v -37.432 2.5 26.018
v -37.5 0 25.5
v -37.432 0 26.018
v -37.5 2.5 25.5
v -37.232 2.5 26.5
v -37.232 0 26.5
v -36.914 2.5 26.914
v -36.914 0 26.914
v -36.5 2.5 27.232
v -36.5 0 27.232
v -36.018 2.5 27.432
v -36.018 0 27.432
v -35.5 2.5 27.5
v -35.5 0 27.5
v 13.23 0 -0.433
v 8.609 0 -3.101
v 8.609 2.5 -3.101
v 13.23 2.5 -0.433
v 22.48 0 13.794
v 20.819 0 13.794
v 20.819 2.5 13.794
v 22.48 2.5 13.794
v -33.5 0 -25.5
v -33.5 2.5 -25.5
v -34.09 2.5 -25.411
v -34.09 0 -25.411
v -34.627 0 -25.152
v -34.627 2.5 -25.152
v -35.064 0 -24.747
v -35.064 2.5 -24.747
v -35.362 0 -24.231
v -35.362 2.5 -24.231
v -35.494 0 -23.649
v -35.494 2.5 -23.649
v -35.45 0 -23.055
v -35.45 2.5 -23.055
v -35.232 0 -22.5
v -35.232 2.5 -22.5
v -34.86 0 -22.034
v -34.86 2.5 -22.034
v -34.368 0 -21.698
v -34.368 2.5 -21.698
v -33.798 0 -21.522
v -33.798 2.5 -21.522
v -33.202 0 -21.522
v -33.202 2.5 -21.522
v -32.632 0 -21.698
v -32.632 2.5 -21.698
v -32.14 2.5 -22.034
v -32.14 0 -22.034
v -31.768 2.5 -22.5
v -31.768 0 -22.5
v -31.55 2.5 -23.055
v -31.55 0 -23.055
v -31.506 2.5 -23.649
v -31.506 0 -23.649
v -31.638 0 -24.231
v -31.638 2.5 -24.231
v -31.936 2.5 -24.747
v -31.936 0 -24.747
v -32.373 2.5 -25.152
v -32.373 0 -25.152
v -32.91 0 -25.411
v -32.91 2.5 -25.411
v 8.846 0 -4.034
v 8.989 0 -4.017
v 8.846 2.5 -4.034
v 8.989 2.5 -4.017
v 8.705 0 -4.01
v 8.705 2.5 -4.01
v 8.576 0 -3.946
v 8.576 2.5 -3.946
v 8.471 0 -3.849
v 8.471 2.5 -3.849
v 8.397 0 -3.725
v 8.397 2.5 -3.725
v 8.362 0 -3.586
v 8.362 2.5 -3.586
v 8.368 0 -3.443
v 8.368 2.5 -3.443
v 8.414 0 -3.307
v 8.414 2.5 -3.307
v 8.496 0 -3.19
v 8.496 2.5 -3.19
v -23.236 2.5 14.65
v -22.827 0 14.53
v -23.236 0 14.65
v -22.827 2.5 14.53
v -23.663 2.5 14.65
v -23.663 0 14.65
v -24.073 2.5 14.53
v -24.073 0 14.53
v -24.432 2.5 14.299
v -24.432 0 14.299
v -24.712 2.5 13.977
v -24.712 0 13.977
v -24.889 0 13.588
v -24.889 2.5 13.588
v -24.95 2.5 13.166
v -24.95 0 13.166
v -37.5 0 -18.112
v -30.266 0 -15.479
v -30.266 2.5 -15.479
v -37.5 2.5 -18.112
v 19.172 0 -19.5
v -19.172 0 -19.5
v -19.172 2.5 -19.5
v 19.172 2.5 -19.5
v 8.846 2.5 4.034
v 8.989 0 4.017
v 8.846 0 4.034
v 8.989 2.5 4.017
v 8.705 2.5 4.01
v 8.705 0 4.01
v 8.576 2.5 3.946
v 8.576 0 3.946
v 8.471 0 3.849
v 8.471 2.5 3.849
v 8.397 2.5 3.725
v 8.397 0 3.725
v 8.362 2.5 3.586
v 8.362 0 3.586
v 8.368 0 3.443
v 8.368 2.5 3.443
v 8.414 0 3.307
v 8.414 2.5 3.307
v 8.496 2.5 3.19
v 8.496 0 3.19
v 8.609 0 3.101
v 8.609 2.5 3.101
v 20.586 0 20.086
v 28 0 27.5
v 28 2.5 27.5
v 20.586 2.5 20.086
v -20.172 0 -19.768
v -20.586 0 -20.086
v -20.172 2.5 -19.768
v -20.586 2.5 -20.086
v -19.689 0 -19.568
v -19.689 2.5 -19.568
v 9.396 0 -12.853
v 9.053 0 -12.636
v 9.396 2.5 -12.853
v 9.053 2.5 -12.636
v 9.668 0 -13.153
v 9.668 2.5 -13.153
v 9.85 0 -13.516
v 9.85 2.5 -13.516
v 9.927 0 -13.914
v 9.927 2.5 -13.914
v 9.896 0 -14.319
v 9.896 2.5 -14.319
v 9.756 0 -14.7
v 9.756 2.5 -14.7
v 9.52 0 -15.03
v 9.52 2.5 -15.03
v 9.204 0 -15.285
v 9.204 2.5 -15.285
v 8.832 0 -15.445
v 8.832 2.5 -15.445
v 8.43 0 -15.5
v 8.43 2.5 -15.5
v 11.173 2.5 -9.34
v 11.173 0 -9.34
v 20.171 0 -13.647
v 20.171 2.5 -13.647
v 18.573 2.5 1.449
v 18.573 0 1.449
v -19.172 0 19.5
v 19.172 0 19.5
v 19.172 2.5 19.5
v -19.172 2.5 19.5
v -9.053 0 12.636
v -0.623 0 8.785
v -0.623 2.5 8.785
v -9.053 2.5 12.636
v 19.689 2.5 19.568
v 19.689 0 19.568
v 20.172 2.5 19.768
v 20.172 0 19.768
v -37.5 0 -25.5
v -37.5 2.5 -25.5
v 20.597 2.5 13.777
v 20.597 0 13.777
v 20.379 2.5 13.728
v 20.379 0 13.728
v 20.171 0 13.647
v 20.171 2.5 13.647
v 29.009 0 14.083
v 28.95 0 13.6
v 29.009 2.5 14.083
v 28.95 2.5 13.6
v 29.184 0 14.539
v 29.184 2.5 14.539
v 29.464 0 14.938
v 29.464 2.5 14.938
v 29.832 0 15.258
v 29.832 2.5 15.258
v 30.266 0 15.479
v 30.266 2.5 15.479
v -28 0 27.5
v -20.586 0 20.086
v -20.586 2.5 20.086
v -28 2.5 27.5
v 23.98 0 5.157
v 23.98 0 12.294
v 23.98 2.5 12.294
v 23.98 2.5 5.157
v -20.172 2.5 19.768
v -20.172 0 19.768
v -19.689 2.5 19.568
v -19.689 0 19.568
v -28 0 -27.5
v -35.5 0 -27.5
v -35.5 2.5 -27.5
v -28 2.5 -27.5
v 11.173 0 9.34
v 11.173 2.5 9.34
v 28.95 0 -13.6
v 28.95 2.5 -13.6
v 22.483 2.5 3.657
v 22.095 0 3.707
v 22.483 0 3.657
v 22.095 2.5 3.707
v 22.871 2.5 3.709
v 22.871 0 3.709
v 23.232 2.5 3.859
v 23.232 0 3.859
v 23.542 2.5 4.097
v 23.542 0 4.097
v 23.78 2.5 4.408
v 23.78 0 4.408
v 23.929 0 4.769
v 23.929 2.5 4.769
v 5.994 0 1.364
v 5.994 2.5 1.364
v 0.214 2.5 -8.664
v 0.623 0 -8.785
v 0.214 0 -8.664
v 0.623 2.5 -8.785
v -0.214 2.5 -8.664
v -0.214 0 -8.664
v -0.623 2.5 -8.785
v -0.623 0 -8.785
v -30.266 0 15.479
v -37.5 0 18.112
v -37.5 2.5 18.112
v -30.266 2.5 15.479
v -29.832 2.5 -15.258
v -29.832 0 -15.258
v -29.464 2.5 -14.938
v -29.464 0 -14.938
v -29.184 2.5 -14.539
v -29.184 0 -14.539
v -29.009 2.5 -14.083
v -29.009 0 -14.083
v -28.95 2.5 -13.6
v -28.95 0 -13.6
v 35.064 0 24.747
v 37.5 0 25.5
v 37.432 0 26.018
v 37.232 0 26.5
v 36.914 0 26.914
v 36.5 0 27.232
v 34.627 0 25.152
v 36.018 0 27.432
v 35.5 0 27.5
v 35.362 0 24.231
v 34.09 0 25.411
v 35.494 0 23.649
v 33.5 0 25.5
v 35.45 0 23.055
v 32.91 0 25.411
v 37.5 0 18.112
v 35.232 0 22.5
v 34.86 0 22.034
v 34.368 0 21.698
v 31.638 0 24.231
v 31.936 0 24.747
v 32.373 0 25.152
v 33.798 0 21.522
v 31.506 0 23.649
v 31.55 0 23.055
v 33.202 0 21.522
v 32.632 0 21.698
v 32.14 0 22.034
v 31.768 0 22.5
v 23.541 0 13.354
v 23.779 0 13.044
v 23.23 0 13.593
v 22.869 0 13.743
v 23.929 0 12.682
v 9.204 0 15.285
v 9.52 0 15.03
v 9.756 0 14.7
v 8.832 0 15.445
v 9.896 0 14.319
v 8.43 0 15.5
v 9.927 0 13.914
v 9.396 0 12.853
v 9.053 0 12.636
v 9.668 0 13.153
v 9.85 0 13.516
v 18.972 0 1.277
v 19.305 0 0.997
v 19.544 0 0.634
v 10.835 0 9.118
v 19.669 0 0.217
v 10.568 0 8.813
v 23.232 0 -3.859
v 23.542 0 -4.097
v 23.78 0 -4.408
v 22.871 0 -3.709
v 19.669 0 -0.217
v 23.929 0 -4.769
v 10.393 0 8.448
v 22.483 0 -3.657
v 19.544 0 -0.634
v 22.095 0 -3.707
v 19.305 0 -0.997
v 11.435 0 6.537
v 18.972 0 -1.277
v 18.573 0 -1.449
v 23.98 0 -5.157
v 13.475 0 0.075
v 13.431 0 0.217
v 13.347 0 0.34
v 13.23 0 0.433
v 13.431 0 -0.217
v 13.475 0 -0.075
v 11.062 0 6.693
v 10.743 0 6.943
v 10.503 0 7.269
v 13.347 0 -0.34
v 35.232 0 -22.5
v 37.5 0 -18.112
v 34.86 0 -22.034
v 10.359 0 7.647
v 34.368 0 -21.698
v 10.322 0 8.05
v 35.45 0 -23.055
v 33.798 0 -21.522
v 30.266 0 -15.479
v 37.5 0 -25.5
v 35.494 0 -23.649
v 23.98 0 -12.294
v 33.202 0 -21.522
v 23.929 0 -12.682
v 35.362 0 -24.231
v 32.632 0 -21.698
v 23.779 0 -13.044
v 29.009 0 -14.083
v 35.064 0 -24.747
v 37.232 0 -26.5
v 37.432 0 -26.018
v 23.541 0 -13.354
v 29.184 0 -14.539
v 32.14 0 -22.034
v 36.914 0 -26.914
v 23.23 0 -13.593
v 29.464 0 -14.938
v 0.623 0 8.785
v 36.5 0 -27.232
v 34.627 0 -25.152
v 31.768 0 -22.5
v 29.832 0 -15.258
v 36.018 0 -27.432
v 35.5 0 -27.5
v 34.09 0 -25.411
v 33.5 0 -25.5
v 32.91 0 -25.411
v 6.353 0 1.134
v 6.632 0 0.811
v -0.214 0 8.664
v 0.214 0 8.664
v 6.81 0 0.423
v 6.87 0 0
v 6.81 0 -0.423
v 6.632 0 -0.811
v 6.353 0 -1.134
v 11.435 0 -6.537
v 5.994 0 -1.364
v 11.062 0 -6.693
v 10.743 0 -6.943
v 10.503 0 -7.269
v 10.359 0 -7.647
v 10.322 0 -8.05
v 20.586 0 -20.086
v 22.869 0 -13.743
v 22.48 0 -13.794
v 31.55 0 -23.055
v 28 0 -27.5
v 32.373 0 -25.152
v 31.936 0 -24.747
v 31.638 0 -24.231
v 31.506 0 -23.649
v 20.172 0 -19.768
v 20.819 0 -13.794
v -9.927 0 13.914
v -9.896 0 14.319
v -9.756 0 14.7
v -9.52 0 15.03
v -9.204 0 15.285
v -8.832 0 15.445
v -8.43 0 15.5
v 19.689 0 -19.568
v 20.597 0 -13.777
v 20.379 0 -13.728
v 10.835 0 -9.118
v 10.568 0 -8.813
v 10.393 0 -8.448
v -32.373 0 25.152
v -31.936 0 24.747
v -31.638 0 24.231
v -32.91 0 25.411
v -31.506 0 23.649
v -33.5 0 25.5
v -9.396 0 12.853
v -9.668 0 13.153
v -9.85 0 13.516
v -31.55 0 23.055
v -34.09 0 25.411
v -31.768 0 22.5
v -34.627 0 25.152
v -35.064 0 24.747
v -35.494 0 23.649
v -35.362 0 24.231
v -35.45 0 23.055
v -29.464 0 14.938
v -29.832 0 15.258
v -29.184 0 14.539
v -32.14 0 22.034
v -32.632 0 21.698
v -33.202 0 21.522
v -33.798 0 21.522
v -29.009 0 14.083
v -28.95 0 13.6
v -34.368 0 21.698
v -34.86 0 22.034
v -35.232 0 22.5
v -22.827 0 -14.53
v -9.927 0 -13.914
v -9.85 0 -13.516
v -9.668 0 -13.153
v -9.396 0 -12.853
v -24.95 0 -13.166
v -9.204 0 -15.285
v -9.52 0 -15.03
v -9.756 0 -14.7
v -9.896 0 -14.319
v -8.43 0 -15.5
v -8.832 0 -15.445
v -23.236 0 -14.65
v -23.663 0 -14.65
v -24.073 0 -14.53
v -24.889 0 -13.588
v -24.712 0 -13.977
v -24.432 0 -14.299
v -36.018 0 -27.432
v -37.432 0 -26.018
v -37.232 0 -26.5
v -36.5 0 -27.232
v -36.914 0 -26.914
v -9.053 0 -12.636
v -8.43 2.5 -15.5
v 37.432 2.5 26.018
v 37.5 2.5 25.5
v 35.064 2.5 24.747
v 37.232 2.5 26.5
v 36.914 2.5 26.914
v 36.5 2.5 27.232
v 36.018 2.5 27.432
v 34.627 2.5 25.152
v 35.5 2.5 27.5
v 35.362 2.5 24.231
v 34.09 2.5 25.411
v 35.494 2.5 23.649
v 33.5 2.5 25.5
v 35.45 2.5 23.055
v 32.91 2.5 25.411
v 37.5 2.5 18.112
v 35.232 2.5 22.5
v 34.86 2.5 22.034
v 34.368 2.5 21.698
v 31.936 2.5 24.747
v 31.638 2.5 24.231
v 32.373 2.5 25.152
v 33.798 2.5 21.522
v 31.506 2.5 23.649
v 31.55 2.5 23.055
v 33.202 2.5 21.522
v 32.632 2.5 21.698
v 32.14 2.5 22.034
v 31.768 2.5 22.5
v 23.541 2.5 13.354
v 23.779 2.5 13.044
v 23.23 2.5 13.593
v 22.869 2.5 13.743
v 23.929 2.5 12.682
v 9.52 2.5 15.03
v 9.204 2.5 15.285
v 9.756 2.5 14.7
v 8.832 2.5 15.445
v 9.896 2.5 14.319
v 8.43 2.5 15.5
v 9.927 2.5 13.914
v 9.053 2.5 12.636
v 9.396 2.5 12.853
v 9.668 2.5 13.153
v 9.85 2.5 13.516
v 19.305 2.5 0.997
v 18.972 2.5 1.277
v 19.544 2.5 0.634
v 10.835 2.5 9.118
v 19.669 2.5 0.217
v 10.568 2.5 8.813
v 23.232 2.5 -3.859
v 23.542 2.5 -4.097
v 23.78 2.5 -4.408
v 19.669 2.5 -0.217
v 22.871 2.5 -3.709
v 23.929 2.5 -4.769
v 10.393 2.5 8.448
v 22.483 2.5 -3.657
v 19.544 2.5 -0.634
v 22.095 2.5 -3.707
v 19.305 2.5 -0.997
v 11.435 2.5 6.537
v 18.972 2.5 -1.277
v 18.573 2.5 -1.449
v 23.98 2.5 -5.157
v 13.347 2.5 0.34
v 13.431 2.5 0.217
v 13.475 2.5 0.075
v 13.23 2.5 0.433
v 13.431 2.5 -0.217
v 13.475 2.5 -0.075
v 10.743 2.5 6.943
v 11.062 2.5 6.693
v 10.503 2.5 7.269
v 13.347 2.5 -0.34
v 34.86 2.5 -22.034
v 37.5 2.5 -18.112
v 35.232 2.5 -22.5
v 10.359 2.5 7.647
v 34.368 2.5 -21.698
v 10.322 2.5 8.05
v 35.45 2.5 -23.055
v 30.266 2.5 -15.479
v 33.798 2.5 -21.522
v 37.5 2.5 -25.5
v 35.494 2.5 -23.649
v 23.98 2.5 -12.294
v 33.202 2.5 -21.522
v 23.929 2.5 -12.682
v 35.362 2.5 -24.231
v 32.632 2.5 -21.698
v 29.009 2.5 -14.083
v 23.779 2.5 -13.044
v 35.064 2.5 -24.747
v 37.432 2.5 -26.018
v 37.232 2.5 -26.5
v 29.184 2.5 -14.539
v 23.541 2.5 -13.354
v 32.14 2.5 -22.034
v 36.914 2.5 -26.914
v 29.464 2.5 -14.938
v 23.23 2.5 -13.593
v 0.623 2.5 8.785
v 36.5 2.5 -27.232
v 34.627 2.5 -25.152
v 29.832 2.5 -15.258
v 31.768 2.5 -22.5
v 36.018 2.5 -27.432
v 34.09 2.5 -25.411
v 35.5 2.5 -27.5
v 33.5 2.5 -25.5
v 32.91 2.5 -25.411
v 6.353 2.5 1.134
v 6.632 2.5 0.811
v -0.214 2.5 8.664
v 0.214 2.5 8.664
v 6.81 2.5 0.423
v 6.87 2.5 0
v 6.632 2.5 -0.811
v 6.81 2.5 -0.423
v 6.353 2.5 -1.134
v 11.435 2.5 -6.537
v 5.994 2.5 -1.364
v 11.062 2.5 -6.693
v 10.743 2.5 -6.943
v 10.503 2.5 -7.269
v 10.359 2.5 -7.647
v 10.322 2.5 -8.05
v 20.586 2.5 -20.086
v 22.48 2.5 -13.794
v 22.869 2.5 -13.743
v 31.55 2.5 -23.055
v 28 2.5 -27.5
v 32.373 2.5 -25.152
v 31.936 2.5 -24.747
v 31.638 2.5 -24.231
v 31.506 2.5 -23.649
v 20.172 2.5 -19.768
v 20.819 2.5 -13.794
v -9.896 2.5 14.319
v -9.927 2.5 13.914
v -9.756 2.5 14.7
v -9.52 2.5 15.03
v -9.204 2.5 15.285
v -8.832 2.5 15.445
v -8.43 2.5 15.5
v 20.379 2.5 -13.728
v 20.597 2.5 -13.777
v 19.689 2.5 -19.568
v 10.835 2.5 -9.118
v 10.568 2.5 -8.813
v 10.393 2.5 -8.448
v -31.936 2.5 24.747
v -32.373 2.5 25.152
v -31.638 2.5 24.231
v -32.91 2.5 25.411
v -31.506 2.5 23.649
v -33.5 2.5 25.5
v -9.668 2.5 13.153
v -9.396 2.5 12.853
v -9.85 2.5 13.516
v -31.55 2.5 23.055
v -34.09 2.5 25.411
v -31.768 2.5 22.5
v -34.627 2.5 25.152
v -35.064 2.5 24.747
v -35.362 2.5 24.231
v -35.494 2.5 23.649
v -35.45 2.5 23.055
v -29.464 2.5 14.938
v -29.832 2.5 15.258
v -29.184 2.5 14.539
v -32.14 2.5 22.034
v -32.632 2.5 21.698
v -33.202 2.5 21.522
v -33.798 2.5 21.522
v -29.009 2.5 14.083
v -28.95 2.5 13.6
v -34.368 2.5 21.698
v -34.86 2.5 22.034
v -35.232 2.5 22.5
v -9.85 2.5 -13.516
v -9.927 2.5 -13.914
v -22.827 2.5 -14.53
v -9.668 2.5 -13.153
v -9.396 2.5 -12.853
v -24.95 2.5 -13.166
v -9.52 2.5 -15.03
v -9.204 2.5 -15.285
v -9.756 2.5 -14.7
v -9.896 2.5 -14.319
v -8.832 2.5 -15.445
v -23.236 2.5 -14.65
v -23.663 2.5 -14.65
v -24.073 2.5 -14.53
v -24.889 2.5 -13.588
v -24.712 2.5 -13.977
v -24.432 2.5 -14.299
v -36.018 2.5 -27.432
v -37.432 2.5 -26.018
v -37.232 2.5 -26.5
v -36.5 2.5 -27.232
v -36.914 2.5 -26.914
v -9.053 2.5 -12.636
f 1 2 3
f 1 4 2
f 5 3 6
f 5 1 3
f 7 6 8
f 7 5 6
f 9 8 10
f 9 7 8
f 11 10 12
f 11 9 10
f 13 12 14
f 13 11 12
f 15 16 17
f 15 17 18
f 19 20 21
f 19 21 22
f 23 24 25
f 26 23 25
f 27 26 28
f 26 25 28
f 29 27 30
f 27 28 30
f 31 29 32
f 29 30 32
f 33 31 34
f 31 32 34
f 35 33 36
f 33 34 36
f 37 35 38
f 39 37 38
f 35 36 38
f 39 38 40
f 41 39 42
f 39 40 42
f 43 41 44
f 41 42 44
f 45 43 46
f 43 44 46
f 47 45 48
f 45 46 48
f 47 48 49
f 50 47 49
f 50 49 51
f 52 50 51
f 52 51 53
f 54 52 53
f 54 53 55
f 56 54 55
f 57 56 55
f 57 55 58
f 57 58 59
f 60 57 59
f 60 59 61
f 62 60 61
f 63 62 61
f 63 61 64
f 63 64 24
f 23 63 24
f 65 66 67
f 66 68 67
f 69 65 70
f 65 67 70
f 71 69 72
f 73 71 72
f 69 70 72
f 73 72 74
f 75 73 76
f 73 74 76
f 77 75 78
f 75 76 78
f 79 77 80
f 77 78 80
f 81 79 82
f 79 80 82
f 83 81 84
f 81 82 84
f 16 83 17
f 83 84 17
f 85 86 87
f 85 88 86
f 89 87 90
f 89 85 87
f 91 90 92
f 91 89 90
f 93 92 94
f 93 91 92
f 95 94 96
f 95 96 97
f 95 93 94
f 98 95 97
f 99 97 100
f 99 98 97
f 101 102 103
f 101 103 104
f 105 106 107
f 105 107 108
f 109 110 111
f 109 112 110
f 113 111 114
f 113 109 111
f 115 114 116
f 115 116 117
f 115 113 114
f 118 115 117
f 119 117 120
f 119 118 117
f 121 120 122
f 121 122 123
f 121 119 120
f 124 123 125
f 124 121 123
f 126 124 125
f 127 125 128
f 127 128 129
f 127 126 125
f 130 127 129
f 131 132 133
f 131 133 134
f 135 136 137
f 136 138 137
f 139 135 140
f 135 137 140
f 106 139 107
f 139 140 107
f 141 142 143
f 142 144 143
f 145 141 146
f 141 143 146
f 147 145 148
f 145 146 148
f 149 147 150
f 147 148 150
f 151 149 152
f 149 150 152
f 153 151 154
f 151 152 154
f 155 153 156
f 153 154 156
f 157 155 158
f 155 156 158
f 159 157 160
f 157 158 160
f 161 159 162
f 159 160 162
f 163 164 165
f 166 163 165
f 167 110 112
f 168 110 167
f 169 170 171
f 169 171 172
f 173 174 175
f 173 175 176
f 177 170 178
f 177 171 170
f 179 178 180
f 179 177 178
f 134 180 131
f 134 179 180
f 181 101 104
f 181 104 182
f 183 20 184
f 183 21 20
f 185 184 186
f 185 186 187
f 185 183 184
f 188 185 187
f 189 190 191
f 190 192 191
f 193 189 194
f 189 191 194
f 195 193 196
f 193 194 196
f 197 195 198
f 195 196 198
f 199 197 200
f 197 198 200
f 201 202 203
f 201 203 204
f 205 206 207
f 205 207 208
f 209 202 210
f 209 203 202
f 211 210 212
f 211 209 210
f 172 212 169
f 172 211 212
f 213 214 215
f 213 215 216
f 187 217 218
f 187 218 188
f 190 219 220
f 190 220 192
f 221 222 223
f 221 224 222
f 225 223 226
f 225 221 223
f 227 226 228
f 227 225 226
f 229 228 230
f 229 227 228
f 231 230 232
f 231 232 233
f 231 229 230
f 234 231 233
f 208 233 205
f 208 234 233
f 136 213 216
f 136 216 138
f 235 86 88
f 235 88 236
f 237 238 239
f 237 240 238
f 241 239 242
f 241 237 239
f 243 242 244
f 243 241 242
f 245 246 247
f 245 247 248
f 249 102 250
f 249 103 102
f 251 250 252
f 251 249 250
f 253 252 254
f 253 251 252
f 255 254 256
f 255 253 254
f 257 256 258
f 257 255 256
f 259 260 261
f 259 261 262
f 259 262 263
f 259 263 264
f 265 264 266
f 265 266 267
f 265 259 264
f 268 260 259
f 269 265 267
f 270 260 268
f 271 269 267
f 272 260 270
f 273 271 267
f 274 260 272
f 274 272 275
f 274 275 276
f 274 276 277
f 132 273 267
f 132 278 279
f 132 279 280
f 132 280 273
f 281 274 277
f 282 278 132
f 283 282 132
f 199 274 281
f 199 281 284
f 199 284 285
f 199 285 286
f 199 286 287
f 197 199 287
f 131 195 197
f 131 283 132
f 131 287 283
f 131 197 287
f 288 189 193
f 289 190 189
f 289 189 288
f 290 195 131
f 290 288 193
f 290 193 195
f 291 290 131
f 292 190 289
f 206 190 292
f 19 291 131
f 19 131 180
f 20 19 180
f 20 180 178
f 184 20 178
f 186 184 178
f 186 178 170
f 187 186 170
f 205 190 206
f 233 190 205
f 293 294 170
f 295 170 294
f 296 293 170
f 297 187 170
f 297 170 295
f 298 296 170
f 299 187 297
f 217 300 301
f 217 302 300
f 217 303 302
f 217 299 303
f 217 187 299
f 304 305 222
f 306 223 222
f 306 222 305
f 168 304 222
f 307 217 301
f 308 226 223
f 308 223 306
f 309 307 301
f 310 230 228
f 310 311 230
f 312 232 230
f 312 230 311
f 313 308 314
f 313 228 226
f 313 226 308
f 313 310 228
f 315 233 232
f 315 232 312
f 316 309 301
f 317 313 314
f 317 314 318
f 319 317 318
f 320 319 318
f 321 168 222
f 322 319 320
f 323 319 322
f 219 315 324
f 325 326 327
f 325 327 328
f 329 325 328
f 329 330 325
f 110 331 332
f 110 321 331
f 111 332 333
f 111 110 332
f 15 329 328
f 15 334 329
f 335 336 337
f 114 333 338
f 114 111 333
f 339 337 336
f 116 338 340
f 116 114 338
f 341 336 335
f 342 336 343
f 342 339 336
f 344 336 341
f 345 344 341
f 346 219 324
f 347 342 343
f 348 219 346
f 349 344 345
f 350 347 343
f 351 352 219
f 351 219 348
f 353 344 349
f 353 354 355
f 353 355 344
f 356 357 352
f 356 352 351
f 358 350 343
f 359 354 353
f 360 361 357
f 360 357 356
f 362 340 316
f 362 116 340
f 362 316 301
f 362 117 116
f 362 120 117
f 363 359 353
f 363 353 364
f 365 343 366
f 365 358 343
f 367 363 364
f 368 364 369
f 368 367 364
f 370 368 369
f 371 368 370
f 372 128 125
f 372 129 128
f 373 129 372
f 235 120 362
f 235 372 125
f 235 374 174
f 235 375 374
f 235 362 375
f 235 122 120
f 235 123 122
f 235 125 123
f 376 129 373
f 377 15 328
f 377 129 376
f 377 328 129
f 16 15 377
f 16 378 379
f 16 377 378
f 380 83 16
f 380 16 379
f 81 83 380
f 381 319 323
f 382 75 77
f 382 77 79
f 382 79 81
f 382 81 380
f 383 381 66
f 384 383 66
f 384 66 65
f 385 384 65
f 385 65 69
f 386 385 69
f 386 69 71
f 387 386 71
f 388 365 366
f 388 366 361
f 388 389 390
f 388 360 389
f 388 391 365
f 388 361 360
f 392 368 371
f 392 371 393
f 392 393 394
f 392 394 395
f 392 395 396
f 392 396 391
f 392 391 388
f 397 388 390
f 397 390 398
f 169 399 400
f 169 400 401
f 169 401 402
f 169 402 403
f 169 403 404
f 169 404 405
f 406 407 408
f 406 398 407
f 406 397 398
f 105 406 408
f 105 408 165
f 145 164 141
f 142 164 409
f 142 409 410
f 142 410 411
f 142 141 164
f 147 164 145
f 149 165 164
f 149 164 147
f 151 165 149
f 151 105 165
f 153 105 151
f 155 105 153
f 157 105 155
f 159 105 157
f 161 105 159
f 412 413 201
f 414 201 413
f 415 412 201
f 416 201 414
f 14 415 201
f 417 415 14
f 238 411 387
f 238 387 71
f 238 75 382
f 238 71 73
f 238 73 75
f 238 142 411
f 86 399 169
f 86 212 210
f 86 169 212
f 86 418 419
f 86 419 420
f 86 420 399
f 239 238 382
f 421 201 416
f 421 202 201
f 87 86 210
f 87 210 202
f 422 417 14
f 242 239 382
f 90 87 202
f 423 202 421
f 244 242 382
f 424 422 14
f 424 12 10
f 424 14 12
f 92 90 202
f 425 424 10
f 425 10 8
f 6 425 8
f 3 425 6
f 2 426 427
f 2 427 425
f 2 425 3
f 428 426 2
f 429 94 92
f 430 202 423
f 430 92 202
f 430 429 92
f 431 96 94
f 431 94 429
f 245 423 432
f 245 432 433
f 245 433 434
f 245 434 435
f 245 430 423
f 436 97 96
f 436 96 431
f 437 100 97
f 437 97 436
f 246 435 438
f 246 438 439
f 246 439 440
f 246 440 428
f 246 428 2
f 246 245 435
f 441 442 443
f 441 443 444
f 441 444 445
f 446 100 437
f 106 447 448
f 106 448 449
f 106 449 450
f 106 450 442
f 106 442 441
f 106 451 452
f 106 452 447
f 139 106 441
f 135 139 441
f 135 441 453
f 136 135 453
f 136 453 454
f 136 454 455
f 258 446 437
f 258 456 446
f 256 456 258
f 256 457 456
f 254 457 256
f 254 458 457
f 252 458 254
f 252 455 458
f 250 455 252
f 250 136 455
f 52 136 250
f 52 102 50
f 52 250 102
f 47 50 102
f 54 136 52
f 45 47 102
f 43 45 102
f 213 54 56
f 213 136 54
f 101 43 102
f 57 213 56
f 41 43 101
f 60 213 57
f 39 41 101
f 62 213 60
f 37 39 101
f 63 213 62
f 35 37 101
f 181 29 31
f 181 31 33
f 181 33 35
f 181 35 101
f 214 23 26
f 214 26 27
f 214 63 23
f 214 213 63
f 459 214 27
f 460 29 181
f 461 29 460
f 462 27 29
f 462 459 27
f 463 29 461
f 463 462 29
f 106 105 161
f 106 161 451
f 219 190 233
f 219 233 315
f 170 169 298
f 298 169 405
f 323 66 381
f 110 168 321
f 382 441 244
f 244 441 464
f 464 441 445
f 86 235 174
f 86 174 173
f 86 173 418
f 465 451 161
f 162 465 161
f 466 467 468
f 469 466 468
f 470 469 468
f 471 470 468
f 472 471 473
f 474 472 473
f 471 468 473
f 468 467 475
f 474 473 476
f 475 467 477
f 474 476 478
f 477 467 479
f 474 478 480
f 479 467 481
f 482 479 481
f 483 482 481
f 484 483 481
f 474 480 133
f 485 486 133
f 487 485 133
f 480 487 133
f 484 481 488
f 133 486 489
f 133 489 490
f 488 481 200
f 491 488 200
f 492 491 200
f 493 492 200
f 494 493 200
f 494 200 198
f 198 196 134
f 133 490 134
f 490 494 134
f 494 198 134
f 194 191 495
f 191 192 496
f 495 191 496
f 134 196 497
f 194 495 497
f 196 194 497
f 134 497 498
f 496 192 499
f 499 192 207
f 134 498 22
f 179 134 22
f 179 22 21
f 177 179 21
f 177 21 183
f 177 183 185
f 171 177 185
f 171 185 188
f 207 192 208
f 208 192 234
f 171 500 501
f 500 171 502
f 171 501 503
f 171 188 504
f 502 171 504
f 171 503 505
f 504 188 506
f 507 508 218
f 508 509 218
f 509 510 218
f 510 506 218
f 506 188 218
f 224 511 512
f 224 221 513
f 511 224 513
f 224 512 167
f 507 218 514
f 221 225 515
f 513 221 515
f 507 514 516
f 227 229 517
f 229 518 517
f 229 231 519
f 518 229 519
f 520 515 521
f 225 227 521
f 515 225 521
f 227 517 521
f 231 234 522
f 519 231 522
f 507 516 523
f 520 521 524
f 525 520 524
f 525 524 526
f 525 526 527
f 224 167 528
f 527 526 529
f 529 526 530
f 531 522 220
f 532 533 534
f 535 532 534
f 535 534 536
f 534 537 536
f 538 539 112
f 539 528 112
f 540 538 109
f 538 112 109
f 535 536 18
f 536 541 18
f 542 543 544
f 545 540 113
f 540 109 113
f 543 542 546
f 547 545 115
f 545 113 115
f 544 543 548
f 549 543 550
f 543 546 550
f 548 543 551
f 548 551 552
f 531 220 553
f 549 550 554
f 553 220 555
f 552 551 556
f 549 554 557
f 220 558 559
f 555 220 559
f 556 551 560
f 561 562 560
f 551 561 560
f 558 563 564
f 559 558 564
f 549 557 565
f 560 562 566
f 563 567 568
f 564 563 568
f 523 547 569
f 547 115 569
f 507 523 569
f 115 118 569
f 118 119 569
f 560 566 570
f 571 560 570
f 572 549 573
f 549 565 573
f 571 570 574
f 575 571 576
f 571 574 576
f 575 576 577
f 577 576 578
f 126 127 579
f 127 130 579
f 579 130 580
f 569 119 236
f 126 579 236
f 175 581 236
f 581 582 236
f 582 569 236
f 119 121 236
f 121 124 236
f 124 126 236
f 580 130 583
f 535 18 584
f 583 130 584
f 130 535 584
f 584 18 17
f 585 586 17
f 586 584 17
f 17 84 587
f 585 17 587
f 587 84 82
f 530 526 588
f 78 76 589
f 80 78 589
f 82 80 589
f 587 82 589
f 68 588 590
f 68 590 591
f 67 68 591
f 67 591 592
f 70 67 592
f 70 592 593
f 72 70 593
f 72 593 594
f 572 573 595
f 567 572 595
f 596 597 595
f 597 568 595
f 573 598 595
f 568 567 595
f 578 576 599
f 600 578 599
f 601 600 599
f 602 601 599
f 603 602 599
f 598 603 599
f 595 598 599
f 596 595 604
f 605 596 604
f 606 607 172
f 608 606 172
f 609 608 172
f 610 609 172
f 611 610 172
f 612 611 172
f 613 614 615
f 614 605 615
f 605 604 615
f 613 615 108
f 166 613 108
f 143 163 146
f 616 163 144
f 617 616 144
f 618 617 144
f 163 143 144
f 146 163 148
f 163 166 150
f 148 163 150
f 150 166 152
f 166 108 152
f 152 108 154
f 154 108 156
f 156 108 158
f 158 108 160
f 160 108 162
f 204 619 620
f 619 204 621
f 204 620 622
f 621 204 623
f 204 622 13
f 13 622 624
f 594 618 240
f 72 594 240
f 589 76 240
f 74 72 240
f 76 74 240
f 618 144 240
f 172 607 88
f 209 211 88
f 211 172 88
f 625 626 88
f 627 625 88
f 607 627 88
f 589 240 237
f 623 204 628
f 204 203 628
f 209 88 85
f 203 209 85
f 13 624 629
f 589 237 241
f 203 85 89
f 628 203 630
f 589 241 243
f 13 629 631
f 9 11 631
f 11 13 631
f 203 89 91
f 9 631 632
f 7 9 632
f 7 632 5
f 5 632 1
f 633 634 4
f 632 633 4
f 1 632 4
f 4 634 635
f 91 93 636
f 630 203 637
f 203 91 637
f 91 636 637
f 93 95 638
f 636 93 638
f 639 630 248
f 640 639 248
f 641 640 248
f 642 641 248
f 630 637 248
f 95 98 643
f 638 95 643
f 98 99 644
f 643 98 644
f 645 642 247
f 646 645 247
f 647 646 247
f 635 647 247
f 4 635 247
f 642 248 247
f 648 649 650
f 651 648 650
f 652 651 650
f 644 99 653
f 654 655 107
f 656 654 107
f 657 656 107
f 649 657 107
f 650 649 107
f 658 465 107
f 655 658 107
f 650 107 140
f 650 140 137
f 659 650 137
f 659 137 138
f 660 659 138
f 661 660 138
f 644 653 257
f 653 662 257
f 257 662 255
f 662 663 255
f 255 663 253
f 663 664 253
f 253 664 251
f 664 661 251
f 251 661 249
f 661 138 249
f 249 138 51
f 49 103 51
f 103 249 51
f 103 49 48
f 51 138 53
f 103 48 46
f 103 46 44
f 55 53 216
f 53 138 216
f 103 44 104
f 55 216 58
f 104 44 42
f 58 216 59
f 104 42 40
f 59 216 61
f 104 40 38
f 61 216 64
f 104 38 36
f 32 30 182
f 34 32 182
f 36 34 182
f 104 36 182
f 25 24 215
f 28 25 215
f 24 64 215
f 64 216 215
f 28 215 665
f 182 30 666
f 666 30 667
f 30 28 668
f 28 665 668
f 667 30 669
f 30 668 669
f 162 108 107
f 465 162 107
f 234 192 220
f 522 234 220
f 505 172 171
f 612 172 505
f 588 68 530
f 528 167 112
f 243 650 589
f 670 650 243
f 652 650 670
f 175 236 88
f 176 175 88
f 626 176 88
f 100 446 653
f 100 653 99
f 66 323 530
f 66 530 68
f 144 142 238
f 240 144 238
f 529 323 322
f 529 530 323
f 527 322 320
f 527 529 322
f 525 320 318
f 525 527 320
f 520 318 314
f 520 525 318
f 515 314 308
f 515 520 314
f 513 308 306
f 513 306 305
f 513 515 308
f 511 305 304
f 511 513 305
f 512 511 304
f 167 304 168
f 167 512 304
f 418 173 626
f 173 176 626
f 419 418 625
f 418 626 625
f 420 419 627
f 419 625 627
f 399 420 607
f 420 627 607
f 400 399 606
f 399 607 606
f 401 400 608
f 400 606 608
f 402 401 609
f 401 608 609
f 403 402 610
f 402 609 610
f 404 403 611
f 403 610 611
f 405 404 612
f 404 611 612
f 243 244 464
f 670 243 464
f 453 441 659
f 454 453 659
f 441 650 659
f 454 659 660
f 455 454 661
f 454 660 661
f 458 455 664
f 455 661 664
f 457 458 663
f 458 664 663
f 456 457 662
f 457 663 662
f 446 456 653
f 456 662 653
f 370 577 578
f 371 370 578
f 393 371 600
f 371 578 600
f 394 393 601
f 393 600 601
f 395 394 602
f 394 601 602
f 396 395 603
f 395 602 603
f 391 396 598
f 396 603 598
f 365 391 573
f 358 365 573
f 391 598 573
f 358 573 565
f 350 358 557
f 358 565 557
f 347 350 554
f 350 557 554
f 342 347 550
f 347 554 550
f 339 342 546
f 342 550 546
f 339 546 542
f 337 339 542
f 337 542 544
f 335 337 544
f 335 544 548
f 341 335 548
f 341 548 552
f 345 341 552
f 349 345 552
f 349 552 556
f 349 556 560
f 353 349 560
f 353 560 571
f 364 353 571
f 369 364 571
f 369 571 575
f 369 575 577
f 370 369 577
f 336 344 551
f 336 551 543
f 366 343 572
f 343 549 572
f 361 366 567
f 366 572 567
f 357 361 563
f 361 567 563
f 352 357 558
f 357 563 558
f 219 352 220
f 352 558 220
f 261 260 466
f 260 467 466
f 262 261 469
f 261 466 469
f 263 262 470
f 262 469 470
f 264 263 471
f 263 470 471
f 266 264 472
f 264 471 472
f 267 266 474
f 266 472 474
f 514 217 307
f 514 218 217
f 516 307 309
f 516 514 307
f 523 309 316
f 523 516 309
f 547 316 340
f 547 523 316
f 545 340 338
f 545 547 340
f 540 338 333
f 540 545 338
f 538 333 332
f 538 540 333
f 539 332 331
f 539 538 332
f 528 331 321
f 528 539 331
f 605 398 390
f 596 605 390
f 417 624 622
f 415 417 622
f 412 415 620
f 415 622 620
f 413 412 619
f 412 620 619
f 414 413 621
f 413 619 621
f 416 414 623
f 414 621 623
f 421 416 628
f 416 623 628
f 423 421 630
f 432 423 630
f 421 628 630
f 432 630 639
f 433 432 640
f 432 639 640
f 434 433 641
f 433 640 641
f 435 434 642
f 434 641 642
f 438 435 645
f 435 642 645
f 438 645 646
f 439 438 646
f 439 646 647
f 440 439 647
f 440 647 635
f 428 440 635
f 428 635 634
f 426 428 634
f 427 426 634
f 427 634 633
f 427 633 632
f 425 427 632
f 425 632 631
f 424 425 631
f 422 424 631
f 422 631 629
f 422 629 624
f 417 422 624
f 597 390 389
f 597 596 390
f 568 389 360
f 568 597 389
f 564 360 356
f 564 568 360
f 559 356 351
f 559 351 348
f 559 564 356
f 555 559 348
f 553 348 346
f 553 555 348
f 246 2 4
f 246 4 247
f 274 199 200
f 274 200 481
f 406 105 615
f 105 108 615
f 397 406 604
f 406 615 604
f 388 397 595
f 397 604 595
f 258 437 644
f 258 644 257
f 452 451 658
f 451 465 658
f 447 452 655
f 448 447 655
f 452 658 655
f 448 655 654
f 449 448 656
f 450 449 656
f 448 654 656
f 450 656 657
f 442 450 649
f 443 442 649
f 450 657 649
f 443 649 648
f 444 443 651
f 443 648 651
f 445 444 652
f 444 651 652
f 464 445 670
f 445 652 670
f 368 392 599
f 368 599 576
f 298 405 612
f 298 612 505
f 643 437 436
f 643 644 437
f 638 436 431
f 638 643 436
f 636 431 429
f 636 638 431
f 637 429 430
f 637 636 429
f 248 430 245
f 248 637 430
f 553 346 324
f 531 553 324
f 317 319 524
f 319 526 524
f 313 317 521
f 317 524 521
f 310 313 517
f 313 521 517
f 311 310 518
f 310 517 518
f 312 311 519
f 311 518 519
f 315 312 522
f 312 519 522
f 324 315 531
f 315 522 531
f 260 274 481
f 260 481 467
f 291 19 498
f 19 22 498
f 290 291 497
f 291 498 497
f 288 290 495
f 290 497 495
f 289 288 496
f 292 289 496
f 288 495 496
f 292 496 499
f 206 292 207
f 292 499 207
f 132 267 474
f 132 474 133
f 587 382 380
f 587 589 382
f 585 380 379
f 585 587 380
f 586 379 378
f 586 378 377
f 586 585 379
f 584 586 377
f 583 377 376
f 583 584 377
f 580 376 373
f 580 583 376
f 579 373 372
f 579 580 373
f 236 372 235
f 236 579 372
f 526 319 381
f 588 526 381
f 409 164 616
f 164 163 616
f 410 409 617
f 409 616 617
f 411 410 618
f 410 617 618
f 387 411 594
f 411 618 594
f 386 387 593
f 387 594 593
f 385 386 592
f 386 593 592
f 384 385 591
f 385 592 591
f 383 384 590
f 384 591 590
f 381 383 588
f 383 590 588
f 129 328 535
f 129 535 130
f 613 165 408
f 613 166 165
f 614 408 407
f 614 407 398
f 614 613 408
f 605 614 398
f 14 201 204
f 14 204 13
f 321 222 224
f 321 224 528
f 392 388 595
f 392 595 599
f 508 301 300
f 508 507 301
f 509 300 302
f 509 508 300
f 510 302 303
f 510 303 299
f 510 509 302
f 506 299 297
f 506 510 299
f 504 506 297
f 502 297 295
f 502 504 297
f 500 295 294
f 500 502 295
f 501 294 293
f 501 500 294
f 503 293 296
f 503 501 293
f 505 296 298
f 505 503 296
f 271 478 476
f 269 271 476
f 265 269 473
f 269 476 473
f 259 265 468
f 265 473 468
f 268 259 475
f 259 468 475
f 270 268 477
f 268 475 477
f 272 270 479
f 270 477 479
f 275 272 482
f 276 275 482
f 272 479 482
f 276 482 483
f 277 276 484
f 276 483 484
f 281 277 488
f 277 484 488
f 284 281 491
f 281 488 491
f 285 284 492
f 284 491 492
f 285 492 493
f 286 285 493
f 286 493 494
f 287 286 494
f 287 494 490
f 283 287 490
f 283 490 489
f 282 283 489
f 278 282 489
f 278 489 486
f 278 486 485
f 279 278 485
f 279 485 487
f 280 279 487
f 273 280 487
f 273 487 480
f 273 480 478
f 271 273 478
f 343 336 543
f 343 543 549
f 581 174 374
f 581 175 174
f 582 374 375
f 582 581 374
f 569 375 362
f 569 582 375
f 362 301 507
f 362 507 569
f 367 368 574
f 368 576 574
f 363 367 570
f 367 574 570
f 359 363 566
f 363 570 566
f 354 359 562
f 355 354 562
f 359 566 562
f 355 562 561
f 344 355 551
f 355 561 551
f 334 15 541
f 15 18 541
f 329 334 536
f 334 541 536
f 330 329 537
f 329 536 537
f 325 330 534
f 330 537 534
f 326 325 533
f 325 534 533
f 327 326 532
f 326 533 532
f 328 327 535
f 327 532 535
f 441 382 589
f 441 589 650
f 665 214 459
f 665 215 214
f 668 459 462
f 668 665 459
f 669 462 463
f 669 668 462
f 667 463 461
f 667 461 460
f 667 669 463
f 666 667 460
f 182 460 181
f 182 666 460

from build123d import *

# Parameters (mm, degrees)
EXTRUDE_1_DEPTH     = 2.5
FILLET_2_R          = 1.5
FILLET_3_R          = 0.5
SKETCH_3_R          = 2
CUT_EXTRUDE_1_DEPTH = 47.569840025
FILLET_4_R          = 2


with BuildPart() as part:
    # 草图2 → 凸台-拉伸1 (new body)
    with BuildSketch(Plane(origin=(0, 0, 0), x_dir=(1, 0, 0), z_dir=(0, 1, 0))):
        Polygon((-37.5, 27.5), (-28, 27.5), (-20, 19.5), (20, 19.5), (28, 27.5), (37.5, 27.5), (37.5, 18.111945503), (28.95, 15), (28.95, -15), (37.5, -18.111945503), (37.5, -27.5), (28, -27.5), (20, -19.5), (-20, -19.5), (-28, -27.5), (-37.5, -27.5), (-37.5, -18.111945503), (-28.95, -15), (-28.95, 15), (-37.5, 18.111945503), align=None)
        Polygon((15.323396198, 15.5), (0, 8.5), (-15.323396198, 15.5), align=None, mode=Mode.SUBTRACT)
        Polygon((-24.95, 15.5), (-24.95, -15.5), (8.980377297, 0), align=None, mode=Mode.SUBTRACT)
        Polygon((-15.323396198, -15.5), (15.323396198, -15.5), (0, -8.5), align=None, mode=Mode.SUBTRACT)
        Polygon((5.320123259, 5), (13.980377297, 0), (5.320123259, -5), (23.980377297, 0), align=None, mode=Mode.SUBTRACT)
        Polygon((7.499709521, 7.581961581), (20.478475988, 13.793792116), (23.980377297, 13.793792116), (23.980377297, 3.206634177), align=None, mode=Mode.SUBTRACT)
        Polygon((23.980377297, -13.793792116), (23.980377297, -3.206634177), (7.499709521, -7.581961581), (20.478475988, -13.793792116), align=None, mode=Mode.SUBTRACT)
    extrude(amount=EXTRUDE_1_DEPTH)

    # 圆角2
    fillet_2_edges = [part.edges().sort_by_distance(p)[0] for p in [
        (20.478475988, 1.25, 13.793792116),
        (23.980377297, 1.25, 13.793792116),
        (23.980377297, 1.25, 3.206634177),
        (7.499709521, 1.25, 7.581961581),
        (0, 1.25, 8.5),
        (-15.323396198, 1.25, 15.5),
        (15.323396198, 1.25, 15.5),
        (8.980377297, 1.25, 0),
        (-24.95, 1.25, -15.5),
        (-24.95, 1.25, 15.5),
        (-15.323396198, 1.25, -15.5),
        (0, 1.25, -8.5),
        (15.323396198, 1.25, -15.5),
        (23.980377297, 1.25, 0),
        (7.499709521, 1.25, -7.581961581),
        (23.980377297, 1.25, -3.206634177),
        (23.980377297, 1.25, -13.793792116),
        (20.478475988, 1.25, -13.793792116),
    ]]
    fillet(fillet_2_edges, radius=FILLET_2_R)

    # 圆角3
    fillet_3_edges = [part.edges().sort_by_distance(p)[0] for p in [
        (5.320123259, 1.25, -5),
        (13.980377297, 1.25, 0),
        (5.320123259, 1.25, 5),
    ]]
    fillet(fillet_3_edges, radius=FILLET_3_R)

    # 草图3 → 切除-拉伸1 (cut, through all)
    with BuildSketch(Plane(origin=(0, 2.5, 0), x_dir=(1, 0, 0), z_dir=(0, 1, 0))):
        with Locations(Location((-33.5, -23.5, 0), (0, 0, 270))):
            Circle(SKETCH_3_R)
        with Locations(Location((33.5, -23.5, 0), (0, 0, 270))):
            Circle(SKETCH_3_R)
        with Locations(Location((33.5, 23.5, 0), (0, 0, 90))):
            Circle(SKETCH_3_R)
        with Locations(Location((-33.5, 23.5, 0), (0, 0, 90))):
            Circle(SKETCH_3_R)
    extrude(amount=-CUT_EXTRUDE_1_DEPTH, mode=Mode.SUBTRACT)

    # 圆角4
    fillet_4_edges = [part.edges().sort_by_distance(p)[0] for p in [
        (20, 1.25, 19.5),
        (-20, 1.25, 19.5),
        (-37.5, 1.25, 27.5),
        (-28.95, 1.25, 15),
        (-28.95, 1.25, -15),
        (-37.5, 1.25, -27.5),
        (-20, 1.25, -19.5),
        (20, 1.25, -19.5),
        (37.5, 1.25, -27.5),
        (28.95, 1.25, -15),
        (28.95, 1.25, 15),
        (37.5, 1.25, 27.5),
    ]]
    fillet(fillet_4_edges, radius=FILLET_4_R)


solid = part.part
